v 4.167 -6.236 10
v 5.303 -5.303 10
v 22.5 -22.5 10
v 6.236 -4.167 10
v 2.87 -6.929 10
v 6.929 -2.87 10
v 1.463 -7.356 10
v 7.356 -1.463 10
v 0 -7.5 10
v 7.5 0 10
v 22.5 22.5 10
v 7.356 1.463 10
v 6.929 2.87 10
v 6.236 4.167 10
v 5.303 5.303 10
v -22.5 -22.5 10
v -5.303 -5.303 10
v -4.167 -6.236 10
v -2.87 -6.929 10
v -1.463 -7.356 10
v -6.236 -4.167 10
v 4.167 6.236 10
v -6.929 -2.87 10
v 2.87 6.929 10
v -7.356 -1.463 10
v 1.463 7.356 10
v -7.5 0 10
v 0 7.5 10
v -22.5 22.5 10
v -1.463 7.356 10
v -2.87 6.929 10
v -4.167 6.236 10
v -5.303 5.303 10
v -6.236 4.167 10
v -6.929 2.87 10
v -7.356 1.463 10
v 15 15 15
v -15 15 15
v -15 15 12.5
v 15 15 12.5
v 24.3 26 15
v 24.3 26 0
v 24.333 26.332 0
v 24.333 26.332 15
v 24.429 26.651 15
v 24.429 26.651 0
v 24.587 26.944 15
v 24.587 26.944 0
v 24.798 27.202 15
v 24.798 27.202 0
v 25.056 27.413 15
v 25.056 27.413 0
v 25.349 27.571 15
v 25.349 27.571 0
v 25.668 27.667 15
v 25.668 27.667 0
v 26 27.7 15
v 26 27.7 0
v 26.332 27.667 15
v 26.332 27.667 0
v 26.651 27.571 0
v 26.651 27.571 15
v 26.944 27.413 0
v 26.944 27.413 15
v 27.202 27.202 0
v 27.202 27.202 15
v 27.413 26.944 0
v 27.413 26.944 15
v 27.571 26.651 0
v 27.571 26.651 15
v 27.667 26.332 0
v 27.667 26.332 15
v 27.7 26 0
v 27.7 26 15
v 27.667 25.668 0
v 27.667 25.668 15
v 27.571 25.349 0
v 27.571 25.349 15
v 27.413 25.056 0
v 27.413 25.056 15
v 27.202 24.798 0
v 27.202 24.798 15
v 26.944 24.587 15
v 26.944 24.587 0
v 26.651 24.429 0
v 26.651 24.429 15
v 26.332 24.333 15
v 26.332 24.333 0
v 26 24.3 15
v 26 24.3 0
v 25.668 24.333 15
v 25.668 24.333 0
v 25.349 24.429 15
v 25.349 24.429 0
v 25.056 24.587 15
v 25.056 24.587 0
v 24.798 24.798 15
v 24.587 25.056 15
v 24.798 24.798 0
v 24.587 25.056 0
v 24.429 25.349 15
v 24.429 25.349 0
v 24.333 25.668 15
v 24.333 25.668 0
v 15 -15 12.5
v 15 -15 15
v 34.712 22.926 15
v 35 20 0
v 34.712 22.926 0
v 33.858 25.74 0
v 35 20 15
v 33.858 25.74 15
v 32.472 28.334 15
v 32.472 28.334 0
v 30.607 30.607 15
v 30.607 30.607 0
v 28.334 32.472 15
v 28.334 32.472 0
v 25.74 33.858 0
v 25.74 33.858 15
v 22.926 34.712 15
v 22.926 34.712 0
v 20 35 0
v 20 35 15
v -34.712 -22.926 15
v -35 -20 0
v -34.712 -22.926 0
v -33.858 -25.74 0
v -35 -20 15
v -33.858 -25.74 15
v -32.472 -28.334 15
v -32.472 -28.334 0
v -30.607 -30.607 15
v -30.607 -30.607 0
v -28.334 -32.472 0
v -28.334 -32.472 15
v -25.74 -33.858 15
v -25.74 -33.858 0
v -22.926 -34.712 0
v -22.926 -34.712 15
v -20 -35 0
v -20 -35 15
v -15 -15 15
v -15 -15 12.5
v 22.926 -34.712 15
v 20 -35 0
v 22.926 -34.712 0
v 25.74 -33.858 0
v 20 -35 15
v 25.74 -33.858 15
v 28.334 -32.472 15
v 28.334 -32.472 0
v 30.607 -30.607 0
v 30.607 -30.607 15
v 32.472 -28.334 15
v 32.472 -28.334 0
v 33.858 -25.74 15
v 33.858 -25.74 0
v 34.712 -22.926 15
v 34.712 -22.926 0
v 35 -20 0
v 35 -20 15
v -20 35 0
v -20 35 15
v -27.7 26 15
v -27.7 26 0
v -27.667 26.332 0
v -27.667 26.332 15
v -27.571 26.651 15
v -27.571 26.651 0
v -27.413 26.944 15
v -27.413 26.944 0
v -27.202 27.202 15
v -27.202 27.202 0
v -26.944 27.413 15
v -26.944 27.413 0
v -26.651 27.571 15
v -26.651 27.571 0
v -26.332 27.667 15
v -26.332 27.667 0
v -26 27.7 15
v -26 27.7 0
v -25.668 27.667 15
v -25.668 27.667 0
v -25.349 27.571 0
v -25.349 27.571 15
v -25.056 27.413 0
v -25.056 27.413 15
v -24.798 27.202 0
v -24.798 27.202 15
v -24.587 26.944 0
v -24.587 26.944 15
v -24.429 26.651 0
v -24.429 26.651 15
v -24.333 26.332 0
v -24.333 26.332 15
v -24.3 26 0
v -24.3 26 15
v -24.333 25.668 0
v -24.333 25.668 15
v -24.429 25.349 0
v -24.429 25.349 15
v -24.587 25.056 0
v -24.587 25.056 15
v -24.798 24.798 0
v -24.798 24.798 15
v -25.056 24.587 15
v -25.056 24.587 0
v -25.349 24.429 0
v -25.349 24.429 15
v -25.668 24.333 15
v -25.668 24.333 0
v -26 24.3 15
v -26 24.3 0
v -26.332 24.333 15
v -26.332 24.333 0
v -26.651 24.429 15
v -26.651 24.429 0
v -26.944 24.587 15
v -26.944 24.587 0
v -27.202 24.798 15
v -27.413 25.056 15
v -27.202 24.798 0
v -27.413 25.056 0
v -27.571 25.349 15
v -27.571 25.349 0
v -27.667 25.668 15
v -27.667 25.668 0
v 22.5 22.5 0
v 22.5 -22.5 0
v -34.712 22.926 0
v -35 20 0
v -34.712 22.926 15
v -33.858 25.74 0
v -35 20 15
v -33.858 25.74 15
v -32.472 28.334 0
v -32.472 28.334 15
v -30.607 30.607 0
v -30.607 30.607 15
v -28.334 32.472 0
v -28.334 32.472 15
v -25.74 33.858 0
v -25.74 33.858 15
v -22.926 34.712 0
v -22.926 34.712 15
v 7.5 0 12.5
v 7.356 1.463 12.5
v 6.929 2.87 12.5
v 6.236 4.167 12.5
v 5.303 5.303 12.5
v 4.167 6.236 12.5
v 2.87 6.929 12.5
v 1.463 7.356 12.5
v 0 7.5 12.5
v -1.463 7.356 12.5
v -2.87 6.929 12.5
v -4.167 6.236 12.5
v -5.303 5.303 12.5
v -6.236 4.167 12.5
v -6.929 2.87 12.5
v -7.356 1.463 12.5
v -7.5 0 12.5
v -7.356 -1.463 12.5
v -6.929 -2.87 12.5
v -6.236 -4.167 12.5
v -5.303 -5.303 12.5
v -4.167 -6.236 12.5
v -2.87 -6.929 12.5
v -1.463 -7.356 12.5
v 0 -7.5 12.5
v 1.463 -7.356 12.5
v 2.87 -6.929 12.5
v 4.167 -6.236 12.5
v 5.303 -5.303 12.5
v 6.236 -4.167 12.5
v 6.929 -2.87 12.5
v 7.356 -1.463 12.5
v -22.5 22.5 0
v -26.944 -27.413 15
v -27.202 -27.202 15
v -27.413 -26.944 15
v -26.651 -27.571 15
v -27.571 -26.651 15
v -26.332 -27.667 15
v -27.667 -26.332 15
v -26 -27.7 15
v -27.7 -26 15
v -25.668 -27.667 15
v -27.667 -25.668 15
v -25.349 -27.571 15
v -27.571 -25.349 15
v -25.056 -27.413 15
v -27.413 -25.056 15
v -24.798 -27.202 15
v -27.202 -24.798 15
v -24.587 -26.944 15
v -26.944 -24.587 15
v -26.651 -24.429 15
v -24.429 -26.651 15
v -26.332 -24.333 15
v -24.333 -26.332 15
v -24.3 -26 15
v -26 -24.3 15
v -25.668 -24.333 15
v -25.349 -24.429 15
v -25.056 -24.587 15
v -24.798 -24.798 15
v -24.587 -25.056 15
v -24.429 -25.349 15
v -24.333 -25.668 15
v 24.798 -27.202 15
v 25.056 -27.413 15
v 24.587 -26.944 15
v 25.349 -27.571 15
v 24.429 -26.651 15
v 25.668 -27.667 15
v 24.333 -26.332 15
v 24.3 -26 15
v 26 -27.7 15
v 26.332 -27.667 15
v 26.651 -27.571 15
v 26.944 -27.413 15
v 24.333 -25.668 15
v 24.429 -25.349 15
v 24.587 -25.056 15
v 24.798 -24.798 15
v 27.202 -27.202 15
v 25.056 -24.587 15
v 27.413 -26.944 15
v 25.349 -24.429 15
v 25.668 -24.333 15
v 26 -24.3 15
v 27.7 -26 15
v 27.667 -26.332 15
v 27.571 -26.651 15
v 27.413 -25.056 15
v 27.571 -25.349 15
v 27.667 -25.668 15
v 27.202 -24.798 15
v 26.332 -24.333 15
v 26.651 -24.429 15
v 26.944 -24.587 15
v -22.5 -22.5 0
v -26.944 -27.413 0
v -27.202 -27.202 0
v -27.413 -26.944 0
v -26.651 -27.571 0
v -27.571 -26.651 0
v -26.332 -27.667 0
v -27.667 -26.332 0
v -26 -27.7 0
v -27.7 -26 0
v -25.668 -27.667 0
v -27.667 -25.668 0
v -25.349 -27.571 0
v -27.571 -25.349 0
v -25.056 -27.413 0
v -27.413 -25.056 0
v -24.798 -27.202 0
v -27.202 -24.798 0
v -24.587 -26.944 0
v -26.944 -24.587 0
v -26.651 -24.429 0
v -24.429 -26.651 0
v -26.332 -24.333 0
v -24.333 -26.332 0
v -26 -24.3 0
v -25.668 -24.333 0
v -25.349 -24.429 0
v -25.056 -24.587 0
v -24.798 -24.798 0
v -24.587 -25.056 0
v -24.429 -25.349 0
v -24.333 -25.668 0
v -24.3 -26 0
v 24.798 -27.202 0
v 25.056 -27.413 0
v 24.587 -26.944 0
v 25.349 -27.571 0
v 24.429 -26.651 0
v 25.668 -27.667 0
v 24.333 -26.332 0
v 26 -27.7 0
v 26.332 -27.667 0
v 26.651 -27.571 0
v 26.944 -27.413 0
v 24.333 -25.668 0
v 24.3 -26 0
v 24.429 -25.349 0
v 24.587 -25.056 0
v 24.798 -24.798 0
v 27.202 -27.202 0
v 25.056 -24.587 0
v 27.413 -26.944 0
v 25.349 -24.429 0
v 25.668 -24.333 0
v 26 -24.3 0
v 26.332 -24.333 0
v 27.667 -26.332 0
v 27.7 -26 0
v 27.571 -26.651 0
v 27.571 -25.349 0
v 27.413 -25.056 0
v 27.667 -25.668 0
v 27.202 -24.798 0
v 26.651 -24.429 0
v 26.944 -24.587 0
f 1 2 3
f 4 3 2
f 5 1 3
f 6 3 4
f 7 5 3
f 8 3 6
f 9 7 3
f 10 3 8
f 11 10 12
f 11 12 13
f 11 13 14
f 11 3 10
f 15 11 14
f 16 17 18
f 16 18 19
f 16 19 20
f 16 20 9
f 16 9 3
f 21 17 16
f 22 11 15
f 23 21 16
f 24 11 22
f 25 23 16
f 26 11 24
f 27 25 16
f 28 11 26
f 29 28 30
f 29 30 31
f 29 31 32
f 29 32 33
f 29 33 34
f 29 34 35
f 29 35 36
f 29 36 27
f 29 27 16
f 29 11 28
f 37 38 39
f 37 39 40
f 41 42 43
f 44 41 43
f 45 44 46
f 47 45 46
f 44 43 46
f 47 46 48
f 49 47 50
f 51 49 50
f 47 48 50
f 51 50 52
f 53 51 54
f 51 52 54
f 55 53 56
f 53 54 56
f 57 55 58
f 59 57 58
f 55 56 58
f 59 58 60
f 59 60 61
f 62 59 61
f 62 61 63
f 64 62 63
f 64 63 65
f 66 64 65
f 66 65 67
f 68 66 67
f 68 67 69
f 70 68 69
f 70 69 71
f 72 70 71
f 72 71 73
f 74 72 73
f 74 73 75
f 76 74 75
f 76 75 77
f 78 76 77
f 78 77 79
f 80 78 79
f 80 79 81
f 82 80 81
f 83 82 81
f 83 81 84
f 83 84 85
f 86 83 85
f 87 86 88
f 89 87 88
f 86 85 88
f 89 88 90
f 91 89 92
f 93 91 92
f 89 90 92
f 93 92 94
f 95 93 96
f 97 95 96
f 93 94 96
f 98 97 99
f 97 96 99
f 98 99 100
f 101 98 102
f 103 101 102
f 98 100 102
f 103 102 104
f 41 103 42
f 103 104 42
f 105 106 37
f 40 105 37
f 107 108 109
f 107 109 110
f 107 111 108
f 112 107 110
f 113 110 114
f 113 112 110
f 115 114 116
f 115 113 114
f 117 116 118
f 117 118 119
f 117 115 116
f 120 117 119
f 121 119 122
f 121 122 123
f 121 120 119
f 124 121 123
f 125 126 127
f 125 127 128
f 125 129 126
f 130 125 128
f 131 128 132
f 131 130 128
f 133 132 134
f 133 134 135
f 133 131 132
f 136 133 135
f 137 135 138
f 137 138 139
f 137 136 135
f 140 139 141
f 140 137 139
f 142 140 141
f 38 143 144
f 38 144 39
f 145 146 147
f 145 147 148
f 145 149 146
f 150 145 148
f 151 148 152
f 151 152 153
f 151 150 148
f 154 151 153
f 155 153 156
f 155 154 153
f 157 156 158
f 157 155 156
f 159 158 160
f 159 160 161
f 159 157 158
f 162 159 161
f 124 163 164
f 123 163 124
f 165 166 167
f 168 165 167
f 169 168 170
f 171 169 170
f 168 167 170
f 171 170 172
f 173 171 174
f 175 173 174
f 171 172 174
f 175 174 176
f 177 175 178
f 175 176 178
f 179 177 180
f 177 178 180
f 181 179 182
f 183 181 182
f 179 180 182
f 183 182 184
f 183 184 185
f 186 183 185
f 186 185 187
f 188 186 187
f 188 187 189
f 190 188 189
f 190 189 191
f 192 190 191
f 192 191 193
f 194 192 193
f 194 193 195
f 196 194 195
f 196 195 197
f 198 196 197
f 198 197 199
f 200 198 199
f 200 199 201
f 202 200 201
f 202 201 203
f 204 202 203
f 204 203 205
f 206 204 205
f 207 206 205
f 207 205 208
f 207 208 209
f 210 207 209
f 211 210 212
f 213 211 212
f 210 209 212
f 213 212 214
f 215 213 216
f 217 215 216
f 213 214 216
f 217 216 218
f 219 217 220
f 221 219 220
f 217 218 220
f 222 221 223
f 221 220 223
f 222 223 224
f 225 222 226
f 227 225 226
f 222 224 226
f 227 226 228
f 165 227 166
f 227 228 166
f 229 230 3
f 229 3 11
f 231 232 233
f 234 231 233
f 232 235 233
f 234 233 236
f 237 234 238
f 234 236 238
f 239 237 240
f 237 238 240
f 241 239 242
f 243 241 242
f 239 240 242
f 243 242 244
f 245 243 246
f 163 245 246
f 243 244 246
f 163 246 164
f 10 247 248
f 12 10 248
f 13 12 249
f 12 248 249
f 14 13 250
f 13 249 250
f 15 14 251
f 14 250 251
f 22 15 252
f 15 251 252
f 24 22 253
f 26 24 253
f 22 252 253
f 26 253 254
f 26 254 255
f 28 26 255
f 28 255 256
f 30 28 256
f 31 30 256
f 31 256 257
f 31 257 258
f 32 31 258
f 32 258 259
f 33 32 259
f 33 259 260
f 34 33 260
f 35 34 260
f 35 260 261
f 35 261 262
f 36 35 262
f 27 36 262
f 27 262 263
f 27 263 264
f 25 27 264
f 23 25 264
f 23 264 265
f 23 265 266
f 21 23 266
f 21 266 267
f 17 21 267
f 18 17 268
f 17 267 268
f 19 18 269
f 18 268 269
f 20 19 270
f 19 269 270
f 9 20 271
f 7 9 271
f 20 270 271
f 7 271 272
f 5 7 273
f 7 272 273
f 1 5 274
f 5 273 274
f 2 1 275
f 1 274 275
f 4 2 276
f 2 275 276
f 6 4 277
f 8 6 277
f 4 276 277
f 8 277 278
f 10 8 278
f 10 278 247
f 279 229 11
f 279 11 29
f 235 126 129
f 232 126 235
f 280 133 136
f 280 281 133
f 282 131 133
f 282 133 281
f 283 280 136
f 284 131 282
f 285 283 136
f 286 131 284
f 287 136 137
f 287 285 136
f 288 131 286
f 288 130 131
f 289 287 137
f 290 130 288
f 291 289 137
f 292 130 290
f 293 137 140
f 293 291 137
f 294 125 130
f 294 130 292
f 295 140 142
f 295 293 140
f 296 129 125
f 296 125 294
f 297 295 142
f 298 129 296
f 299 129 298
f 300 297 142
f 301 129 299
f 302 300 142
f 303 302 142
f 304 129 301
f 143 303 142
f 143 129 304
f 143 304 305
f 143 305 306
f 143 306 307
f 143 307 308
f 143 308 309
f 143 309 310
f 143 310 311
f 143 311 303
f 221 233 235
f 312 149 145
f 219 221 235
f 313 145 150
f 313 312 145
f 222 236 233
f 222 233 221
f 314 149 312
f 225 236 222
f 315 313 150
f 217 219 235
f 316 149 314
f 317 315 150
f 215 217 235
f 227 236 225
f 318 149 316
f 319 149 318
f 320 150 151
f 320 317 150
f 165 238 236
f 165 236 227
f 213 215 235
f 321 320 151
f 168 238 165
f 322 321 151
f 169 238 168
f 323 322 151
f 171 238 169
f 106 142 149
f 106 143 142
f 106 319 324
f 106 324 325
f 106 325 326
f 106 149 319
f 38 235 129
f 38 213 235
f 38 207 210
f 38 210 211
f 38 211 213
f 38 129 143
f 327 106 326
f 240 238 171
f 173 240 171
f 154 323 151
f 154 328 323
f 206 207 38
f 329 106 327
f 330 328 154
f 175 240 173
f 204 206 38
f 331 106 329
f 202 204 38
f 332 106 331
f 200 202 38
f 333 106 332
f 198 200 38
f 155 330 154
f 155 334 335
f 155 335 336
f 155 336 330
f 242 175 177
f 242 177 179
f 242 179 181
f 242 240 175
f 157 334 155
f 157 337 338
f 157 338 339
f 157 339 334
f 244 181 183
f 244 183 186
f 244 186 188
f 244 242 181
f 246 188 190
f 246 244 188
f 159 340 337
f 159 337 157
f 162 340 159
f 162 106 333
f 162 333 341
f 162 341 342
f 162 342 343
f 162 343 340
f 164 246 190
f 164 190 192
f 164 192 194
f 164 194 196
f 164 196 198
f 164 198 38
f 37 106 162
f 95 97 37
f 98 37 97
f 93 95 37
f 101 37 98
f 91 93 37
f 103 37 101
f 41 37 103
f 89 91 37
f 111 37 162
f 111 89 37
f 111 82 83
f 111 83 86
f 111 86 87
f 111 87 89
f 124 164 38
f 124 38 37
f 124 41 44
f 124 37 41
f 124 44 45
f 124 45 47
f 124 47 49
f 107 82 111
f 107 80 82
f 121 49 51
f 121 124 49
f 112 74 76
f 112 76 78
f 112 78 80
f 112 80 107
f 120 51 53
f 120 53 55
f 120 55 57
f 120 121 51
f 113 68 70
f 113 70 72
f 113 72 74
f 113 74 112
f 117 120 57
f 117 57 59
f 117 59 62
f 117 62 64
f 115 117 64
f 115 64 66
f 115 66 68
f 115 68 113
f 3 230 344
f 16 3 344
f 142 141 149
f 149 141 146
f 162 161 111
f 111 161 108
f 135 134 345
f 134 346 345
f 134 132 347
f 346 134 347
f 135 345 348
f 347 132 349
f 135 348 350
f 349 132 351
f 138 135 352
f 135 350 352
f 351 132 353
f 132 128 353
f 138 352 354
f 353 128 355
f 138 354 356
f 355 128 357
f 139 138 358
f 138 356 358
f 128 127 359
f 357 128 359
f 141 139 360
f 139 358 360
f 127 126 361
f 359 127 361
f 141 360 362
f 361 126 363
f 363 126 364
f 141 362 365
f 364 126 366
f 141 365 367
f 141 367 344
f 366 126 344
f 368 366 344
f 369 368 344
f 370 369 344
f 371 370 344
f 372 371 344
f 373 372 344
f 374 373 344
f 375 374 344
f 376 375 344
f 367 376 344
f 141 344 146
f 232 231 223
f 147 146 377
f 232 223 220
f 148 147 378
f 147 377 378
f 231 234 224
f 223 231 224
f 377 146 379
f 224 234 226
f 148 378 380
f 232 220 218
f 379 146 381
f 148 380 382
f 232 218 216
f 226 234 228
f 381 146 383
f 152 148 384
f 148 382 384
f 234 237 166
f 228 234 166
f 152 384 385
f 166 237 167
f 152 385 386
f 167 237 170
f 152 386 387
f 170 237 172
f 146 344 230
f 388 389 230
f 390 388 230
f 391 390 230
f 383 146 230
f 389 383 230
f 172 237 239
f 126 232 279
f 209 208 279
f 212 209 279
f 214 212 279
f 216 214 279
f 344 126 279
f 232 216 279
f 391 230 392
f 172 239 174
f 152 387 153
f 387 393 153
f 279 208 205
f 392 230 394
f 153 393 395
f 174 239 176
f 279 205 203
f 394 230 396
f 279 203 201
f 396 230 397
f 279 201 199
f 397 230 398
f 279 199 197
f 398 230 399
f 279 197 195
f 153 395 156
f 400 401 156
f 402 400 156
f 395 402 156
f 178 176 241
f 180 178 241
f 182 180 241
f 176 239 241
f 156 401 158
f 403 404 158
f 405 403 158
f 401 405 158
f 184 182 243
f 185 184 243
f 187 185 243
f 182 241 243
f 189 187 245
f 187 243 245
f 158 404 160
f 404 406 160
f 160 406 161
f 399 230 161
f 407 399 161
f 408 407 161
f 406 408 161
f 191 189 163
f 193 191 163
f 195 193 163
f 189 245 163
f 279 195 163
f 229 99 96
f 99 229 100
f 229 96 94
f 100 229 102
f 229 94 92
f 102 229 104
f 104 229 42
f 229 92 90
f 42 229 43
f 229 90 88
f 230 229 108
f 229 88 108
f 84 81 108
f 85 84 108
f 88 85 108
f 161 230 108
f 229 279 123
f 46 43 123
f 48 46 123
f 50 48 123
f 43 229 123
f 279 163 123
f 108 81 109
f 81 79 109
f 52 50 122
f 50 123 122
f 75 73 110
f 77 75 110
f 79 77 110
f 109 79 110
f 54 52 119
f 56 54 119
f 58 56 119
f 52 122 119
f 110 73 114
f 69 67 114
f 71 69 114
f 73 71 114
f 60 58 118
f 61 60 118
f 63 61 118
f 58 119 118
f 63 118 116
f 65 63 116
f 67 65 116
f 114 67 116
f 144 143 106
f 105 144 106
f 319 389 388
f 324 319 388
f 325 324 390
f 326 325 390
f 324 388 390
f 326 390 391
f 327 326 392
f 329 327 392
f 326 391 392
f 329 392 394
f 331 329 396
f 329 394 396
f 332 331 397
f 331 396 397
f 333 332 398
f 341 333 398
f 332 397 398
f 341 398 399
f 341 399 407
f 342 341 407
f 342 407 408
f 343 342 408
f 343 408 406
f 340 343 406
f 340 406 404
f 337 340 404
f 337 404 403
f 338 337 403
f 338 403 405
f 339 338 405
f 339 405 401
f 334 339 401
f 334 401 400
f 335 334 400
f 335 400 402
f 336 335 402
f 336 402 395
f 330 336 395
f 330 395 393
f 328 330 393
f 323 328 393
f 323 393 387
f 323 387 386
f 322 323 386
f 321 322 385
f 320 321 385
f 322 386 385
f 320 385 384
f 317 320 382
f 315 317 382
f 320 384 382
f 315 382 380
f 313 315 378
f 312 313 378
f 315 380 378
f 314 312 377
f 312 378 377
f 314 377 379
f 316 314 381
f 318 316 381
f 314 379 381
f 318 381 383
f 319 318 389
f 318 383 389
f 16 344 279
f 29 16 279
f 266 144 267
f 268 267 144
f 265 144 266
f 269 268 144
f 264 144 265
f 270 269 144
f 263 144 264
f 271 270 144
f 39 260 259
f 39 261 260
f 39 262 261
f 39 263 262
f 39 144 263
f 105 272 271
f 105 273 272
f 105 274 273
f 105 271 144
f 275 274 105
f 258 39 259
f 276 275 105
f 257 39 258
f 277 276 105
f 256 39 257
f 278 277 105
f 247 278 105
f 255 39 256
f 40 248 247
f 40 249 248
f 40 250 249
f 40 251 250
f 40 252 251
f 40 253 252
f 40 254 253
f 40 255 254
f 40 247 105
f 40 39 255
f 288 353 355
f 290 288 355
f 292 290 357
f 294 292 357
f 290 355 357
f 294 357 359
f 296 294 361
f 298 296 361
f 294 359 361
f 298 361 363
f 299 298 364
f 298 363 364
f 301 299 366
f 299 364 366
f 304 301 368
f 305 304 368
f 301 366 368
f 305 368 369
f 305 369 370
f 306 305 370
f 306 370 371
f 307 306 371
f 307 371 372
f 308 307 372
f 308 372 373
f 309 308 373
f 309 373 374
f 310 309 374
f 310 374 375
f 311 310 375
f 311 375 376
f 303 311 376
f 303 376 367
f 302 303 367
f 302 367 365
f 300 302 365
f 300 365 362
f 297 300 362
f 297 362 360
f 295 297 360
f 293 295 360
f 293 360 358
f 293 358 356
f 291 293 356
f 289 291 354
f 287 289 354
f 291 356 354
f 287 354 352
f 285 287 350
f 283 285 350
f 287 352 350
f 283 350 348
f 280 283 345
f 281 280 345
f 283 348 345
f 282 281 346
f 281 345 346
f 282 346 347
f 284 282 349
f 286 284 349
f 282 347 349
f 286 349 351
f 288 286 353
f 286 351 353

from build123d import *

# Parameters (mm, degrees)
SKETCH1_W            = 70
SKETCH1_H            = 70
BOSS_EXTRUDE1_DEPTH  = 15
FILLET1_R            = 15
M3_CLEARANCE_HOLE1_D = 3.4
SKETCH4_R            = 7.5
CUT_EXTRUDE1_DEPTH   = 16
SKETCH5_W            = 30
SKETCH5_H            = 30
CUT_EXTRUDE2_DEPTH   = 2.5
SKETCH6_W            = 45
SKETCH6_H            = 45
CUT_EXTRUDE3_DEPTH   = 10


with BuildPart() as part:
    # Sketch1 → Boss-Extrude1 (new body)
    with BuildSketch(Plane.XY):
        Rectangle(SKETCH1_W, SKETCH1_H)
    extrude(amount=BOSS_EXTRUDE1_DEPTH)

    # Fillet1
    fillet1_edges = [part.edges().sort_by_distance(p)[0] for p in [
        (-35, 35, 7.5),
        (35, 35, 7.5),
        (35, -35, 7.5),
        (-35, -35, 7.5),
    ]]
    fillet(fillet1_edges, radius=FILLET1_R)

    # M3 Clearance Hole1 (through all)
    with Locations(Plane.XY.offset(15)):
        with Locations((-26, -26), (26, -26), (26, 26), (-26, 26)):
            Hole(M3_CLEARANCE_HOLE1_D / 2)

    # Sketch4 → Cut-Extrude1 (cut, through all)
    with BuildSketch(Plane.XY.offset(15)):
        Circle(SKETCH4_R)
    extrude(amount=-CUT_EXTRUDE1_DEPTH, mode=Mode.SUBTRACT)

    # Sketch5 → Cut-Extrude2 (cut)
    with BuildSketch(Plane.XY.offset(15)):
        Rectangle(SKETCH5_W, SKETCH5_H)
    extrude(amount=-CUT_EXTRUDE2_DEPTH, mode=Mode.SUBTRACT)

    # Sketch6 → Cut-Extrude3 (cut)
    with BuildSketch(Plane(origin=(0, 0, 0), x_dir=(-1, 0, 0), z_dir=(0, 0, -1))):
        Rectangle(SKETCH6_W, SKETCH6_H)
    extrude(amount=-CUT_EXTRUDE3_DEPTH, mode=Mode.SUBTRACT)


solid = part.part
